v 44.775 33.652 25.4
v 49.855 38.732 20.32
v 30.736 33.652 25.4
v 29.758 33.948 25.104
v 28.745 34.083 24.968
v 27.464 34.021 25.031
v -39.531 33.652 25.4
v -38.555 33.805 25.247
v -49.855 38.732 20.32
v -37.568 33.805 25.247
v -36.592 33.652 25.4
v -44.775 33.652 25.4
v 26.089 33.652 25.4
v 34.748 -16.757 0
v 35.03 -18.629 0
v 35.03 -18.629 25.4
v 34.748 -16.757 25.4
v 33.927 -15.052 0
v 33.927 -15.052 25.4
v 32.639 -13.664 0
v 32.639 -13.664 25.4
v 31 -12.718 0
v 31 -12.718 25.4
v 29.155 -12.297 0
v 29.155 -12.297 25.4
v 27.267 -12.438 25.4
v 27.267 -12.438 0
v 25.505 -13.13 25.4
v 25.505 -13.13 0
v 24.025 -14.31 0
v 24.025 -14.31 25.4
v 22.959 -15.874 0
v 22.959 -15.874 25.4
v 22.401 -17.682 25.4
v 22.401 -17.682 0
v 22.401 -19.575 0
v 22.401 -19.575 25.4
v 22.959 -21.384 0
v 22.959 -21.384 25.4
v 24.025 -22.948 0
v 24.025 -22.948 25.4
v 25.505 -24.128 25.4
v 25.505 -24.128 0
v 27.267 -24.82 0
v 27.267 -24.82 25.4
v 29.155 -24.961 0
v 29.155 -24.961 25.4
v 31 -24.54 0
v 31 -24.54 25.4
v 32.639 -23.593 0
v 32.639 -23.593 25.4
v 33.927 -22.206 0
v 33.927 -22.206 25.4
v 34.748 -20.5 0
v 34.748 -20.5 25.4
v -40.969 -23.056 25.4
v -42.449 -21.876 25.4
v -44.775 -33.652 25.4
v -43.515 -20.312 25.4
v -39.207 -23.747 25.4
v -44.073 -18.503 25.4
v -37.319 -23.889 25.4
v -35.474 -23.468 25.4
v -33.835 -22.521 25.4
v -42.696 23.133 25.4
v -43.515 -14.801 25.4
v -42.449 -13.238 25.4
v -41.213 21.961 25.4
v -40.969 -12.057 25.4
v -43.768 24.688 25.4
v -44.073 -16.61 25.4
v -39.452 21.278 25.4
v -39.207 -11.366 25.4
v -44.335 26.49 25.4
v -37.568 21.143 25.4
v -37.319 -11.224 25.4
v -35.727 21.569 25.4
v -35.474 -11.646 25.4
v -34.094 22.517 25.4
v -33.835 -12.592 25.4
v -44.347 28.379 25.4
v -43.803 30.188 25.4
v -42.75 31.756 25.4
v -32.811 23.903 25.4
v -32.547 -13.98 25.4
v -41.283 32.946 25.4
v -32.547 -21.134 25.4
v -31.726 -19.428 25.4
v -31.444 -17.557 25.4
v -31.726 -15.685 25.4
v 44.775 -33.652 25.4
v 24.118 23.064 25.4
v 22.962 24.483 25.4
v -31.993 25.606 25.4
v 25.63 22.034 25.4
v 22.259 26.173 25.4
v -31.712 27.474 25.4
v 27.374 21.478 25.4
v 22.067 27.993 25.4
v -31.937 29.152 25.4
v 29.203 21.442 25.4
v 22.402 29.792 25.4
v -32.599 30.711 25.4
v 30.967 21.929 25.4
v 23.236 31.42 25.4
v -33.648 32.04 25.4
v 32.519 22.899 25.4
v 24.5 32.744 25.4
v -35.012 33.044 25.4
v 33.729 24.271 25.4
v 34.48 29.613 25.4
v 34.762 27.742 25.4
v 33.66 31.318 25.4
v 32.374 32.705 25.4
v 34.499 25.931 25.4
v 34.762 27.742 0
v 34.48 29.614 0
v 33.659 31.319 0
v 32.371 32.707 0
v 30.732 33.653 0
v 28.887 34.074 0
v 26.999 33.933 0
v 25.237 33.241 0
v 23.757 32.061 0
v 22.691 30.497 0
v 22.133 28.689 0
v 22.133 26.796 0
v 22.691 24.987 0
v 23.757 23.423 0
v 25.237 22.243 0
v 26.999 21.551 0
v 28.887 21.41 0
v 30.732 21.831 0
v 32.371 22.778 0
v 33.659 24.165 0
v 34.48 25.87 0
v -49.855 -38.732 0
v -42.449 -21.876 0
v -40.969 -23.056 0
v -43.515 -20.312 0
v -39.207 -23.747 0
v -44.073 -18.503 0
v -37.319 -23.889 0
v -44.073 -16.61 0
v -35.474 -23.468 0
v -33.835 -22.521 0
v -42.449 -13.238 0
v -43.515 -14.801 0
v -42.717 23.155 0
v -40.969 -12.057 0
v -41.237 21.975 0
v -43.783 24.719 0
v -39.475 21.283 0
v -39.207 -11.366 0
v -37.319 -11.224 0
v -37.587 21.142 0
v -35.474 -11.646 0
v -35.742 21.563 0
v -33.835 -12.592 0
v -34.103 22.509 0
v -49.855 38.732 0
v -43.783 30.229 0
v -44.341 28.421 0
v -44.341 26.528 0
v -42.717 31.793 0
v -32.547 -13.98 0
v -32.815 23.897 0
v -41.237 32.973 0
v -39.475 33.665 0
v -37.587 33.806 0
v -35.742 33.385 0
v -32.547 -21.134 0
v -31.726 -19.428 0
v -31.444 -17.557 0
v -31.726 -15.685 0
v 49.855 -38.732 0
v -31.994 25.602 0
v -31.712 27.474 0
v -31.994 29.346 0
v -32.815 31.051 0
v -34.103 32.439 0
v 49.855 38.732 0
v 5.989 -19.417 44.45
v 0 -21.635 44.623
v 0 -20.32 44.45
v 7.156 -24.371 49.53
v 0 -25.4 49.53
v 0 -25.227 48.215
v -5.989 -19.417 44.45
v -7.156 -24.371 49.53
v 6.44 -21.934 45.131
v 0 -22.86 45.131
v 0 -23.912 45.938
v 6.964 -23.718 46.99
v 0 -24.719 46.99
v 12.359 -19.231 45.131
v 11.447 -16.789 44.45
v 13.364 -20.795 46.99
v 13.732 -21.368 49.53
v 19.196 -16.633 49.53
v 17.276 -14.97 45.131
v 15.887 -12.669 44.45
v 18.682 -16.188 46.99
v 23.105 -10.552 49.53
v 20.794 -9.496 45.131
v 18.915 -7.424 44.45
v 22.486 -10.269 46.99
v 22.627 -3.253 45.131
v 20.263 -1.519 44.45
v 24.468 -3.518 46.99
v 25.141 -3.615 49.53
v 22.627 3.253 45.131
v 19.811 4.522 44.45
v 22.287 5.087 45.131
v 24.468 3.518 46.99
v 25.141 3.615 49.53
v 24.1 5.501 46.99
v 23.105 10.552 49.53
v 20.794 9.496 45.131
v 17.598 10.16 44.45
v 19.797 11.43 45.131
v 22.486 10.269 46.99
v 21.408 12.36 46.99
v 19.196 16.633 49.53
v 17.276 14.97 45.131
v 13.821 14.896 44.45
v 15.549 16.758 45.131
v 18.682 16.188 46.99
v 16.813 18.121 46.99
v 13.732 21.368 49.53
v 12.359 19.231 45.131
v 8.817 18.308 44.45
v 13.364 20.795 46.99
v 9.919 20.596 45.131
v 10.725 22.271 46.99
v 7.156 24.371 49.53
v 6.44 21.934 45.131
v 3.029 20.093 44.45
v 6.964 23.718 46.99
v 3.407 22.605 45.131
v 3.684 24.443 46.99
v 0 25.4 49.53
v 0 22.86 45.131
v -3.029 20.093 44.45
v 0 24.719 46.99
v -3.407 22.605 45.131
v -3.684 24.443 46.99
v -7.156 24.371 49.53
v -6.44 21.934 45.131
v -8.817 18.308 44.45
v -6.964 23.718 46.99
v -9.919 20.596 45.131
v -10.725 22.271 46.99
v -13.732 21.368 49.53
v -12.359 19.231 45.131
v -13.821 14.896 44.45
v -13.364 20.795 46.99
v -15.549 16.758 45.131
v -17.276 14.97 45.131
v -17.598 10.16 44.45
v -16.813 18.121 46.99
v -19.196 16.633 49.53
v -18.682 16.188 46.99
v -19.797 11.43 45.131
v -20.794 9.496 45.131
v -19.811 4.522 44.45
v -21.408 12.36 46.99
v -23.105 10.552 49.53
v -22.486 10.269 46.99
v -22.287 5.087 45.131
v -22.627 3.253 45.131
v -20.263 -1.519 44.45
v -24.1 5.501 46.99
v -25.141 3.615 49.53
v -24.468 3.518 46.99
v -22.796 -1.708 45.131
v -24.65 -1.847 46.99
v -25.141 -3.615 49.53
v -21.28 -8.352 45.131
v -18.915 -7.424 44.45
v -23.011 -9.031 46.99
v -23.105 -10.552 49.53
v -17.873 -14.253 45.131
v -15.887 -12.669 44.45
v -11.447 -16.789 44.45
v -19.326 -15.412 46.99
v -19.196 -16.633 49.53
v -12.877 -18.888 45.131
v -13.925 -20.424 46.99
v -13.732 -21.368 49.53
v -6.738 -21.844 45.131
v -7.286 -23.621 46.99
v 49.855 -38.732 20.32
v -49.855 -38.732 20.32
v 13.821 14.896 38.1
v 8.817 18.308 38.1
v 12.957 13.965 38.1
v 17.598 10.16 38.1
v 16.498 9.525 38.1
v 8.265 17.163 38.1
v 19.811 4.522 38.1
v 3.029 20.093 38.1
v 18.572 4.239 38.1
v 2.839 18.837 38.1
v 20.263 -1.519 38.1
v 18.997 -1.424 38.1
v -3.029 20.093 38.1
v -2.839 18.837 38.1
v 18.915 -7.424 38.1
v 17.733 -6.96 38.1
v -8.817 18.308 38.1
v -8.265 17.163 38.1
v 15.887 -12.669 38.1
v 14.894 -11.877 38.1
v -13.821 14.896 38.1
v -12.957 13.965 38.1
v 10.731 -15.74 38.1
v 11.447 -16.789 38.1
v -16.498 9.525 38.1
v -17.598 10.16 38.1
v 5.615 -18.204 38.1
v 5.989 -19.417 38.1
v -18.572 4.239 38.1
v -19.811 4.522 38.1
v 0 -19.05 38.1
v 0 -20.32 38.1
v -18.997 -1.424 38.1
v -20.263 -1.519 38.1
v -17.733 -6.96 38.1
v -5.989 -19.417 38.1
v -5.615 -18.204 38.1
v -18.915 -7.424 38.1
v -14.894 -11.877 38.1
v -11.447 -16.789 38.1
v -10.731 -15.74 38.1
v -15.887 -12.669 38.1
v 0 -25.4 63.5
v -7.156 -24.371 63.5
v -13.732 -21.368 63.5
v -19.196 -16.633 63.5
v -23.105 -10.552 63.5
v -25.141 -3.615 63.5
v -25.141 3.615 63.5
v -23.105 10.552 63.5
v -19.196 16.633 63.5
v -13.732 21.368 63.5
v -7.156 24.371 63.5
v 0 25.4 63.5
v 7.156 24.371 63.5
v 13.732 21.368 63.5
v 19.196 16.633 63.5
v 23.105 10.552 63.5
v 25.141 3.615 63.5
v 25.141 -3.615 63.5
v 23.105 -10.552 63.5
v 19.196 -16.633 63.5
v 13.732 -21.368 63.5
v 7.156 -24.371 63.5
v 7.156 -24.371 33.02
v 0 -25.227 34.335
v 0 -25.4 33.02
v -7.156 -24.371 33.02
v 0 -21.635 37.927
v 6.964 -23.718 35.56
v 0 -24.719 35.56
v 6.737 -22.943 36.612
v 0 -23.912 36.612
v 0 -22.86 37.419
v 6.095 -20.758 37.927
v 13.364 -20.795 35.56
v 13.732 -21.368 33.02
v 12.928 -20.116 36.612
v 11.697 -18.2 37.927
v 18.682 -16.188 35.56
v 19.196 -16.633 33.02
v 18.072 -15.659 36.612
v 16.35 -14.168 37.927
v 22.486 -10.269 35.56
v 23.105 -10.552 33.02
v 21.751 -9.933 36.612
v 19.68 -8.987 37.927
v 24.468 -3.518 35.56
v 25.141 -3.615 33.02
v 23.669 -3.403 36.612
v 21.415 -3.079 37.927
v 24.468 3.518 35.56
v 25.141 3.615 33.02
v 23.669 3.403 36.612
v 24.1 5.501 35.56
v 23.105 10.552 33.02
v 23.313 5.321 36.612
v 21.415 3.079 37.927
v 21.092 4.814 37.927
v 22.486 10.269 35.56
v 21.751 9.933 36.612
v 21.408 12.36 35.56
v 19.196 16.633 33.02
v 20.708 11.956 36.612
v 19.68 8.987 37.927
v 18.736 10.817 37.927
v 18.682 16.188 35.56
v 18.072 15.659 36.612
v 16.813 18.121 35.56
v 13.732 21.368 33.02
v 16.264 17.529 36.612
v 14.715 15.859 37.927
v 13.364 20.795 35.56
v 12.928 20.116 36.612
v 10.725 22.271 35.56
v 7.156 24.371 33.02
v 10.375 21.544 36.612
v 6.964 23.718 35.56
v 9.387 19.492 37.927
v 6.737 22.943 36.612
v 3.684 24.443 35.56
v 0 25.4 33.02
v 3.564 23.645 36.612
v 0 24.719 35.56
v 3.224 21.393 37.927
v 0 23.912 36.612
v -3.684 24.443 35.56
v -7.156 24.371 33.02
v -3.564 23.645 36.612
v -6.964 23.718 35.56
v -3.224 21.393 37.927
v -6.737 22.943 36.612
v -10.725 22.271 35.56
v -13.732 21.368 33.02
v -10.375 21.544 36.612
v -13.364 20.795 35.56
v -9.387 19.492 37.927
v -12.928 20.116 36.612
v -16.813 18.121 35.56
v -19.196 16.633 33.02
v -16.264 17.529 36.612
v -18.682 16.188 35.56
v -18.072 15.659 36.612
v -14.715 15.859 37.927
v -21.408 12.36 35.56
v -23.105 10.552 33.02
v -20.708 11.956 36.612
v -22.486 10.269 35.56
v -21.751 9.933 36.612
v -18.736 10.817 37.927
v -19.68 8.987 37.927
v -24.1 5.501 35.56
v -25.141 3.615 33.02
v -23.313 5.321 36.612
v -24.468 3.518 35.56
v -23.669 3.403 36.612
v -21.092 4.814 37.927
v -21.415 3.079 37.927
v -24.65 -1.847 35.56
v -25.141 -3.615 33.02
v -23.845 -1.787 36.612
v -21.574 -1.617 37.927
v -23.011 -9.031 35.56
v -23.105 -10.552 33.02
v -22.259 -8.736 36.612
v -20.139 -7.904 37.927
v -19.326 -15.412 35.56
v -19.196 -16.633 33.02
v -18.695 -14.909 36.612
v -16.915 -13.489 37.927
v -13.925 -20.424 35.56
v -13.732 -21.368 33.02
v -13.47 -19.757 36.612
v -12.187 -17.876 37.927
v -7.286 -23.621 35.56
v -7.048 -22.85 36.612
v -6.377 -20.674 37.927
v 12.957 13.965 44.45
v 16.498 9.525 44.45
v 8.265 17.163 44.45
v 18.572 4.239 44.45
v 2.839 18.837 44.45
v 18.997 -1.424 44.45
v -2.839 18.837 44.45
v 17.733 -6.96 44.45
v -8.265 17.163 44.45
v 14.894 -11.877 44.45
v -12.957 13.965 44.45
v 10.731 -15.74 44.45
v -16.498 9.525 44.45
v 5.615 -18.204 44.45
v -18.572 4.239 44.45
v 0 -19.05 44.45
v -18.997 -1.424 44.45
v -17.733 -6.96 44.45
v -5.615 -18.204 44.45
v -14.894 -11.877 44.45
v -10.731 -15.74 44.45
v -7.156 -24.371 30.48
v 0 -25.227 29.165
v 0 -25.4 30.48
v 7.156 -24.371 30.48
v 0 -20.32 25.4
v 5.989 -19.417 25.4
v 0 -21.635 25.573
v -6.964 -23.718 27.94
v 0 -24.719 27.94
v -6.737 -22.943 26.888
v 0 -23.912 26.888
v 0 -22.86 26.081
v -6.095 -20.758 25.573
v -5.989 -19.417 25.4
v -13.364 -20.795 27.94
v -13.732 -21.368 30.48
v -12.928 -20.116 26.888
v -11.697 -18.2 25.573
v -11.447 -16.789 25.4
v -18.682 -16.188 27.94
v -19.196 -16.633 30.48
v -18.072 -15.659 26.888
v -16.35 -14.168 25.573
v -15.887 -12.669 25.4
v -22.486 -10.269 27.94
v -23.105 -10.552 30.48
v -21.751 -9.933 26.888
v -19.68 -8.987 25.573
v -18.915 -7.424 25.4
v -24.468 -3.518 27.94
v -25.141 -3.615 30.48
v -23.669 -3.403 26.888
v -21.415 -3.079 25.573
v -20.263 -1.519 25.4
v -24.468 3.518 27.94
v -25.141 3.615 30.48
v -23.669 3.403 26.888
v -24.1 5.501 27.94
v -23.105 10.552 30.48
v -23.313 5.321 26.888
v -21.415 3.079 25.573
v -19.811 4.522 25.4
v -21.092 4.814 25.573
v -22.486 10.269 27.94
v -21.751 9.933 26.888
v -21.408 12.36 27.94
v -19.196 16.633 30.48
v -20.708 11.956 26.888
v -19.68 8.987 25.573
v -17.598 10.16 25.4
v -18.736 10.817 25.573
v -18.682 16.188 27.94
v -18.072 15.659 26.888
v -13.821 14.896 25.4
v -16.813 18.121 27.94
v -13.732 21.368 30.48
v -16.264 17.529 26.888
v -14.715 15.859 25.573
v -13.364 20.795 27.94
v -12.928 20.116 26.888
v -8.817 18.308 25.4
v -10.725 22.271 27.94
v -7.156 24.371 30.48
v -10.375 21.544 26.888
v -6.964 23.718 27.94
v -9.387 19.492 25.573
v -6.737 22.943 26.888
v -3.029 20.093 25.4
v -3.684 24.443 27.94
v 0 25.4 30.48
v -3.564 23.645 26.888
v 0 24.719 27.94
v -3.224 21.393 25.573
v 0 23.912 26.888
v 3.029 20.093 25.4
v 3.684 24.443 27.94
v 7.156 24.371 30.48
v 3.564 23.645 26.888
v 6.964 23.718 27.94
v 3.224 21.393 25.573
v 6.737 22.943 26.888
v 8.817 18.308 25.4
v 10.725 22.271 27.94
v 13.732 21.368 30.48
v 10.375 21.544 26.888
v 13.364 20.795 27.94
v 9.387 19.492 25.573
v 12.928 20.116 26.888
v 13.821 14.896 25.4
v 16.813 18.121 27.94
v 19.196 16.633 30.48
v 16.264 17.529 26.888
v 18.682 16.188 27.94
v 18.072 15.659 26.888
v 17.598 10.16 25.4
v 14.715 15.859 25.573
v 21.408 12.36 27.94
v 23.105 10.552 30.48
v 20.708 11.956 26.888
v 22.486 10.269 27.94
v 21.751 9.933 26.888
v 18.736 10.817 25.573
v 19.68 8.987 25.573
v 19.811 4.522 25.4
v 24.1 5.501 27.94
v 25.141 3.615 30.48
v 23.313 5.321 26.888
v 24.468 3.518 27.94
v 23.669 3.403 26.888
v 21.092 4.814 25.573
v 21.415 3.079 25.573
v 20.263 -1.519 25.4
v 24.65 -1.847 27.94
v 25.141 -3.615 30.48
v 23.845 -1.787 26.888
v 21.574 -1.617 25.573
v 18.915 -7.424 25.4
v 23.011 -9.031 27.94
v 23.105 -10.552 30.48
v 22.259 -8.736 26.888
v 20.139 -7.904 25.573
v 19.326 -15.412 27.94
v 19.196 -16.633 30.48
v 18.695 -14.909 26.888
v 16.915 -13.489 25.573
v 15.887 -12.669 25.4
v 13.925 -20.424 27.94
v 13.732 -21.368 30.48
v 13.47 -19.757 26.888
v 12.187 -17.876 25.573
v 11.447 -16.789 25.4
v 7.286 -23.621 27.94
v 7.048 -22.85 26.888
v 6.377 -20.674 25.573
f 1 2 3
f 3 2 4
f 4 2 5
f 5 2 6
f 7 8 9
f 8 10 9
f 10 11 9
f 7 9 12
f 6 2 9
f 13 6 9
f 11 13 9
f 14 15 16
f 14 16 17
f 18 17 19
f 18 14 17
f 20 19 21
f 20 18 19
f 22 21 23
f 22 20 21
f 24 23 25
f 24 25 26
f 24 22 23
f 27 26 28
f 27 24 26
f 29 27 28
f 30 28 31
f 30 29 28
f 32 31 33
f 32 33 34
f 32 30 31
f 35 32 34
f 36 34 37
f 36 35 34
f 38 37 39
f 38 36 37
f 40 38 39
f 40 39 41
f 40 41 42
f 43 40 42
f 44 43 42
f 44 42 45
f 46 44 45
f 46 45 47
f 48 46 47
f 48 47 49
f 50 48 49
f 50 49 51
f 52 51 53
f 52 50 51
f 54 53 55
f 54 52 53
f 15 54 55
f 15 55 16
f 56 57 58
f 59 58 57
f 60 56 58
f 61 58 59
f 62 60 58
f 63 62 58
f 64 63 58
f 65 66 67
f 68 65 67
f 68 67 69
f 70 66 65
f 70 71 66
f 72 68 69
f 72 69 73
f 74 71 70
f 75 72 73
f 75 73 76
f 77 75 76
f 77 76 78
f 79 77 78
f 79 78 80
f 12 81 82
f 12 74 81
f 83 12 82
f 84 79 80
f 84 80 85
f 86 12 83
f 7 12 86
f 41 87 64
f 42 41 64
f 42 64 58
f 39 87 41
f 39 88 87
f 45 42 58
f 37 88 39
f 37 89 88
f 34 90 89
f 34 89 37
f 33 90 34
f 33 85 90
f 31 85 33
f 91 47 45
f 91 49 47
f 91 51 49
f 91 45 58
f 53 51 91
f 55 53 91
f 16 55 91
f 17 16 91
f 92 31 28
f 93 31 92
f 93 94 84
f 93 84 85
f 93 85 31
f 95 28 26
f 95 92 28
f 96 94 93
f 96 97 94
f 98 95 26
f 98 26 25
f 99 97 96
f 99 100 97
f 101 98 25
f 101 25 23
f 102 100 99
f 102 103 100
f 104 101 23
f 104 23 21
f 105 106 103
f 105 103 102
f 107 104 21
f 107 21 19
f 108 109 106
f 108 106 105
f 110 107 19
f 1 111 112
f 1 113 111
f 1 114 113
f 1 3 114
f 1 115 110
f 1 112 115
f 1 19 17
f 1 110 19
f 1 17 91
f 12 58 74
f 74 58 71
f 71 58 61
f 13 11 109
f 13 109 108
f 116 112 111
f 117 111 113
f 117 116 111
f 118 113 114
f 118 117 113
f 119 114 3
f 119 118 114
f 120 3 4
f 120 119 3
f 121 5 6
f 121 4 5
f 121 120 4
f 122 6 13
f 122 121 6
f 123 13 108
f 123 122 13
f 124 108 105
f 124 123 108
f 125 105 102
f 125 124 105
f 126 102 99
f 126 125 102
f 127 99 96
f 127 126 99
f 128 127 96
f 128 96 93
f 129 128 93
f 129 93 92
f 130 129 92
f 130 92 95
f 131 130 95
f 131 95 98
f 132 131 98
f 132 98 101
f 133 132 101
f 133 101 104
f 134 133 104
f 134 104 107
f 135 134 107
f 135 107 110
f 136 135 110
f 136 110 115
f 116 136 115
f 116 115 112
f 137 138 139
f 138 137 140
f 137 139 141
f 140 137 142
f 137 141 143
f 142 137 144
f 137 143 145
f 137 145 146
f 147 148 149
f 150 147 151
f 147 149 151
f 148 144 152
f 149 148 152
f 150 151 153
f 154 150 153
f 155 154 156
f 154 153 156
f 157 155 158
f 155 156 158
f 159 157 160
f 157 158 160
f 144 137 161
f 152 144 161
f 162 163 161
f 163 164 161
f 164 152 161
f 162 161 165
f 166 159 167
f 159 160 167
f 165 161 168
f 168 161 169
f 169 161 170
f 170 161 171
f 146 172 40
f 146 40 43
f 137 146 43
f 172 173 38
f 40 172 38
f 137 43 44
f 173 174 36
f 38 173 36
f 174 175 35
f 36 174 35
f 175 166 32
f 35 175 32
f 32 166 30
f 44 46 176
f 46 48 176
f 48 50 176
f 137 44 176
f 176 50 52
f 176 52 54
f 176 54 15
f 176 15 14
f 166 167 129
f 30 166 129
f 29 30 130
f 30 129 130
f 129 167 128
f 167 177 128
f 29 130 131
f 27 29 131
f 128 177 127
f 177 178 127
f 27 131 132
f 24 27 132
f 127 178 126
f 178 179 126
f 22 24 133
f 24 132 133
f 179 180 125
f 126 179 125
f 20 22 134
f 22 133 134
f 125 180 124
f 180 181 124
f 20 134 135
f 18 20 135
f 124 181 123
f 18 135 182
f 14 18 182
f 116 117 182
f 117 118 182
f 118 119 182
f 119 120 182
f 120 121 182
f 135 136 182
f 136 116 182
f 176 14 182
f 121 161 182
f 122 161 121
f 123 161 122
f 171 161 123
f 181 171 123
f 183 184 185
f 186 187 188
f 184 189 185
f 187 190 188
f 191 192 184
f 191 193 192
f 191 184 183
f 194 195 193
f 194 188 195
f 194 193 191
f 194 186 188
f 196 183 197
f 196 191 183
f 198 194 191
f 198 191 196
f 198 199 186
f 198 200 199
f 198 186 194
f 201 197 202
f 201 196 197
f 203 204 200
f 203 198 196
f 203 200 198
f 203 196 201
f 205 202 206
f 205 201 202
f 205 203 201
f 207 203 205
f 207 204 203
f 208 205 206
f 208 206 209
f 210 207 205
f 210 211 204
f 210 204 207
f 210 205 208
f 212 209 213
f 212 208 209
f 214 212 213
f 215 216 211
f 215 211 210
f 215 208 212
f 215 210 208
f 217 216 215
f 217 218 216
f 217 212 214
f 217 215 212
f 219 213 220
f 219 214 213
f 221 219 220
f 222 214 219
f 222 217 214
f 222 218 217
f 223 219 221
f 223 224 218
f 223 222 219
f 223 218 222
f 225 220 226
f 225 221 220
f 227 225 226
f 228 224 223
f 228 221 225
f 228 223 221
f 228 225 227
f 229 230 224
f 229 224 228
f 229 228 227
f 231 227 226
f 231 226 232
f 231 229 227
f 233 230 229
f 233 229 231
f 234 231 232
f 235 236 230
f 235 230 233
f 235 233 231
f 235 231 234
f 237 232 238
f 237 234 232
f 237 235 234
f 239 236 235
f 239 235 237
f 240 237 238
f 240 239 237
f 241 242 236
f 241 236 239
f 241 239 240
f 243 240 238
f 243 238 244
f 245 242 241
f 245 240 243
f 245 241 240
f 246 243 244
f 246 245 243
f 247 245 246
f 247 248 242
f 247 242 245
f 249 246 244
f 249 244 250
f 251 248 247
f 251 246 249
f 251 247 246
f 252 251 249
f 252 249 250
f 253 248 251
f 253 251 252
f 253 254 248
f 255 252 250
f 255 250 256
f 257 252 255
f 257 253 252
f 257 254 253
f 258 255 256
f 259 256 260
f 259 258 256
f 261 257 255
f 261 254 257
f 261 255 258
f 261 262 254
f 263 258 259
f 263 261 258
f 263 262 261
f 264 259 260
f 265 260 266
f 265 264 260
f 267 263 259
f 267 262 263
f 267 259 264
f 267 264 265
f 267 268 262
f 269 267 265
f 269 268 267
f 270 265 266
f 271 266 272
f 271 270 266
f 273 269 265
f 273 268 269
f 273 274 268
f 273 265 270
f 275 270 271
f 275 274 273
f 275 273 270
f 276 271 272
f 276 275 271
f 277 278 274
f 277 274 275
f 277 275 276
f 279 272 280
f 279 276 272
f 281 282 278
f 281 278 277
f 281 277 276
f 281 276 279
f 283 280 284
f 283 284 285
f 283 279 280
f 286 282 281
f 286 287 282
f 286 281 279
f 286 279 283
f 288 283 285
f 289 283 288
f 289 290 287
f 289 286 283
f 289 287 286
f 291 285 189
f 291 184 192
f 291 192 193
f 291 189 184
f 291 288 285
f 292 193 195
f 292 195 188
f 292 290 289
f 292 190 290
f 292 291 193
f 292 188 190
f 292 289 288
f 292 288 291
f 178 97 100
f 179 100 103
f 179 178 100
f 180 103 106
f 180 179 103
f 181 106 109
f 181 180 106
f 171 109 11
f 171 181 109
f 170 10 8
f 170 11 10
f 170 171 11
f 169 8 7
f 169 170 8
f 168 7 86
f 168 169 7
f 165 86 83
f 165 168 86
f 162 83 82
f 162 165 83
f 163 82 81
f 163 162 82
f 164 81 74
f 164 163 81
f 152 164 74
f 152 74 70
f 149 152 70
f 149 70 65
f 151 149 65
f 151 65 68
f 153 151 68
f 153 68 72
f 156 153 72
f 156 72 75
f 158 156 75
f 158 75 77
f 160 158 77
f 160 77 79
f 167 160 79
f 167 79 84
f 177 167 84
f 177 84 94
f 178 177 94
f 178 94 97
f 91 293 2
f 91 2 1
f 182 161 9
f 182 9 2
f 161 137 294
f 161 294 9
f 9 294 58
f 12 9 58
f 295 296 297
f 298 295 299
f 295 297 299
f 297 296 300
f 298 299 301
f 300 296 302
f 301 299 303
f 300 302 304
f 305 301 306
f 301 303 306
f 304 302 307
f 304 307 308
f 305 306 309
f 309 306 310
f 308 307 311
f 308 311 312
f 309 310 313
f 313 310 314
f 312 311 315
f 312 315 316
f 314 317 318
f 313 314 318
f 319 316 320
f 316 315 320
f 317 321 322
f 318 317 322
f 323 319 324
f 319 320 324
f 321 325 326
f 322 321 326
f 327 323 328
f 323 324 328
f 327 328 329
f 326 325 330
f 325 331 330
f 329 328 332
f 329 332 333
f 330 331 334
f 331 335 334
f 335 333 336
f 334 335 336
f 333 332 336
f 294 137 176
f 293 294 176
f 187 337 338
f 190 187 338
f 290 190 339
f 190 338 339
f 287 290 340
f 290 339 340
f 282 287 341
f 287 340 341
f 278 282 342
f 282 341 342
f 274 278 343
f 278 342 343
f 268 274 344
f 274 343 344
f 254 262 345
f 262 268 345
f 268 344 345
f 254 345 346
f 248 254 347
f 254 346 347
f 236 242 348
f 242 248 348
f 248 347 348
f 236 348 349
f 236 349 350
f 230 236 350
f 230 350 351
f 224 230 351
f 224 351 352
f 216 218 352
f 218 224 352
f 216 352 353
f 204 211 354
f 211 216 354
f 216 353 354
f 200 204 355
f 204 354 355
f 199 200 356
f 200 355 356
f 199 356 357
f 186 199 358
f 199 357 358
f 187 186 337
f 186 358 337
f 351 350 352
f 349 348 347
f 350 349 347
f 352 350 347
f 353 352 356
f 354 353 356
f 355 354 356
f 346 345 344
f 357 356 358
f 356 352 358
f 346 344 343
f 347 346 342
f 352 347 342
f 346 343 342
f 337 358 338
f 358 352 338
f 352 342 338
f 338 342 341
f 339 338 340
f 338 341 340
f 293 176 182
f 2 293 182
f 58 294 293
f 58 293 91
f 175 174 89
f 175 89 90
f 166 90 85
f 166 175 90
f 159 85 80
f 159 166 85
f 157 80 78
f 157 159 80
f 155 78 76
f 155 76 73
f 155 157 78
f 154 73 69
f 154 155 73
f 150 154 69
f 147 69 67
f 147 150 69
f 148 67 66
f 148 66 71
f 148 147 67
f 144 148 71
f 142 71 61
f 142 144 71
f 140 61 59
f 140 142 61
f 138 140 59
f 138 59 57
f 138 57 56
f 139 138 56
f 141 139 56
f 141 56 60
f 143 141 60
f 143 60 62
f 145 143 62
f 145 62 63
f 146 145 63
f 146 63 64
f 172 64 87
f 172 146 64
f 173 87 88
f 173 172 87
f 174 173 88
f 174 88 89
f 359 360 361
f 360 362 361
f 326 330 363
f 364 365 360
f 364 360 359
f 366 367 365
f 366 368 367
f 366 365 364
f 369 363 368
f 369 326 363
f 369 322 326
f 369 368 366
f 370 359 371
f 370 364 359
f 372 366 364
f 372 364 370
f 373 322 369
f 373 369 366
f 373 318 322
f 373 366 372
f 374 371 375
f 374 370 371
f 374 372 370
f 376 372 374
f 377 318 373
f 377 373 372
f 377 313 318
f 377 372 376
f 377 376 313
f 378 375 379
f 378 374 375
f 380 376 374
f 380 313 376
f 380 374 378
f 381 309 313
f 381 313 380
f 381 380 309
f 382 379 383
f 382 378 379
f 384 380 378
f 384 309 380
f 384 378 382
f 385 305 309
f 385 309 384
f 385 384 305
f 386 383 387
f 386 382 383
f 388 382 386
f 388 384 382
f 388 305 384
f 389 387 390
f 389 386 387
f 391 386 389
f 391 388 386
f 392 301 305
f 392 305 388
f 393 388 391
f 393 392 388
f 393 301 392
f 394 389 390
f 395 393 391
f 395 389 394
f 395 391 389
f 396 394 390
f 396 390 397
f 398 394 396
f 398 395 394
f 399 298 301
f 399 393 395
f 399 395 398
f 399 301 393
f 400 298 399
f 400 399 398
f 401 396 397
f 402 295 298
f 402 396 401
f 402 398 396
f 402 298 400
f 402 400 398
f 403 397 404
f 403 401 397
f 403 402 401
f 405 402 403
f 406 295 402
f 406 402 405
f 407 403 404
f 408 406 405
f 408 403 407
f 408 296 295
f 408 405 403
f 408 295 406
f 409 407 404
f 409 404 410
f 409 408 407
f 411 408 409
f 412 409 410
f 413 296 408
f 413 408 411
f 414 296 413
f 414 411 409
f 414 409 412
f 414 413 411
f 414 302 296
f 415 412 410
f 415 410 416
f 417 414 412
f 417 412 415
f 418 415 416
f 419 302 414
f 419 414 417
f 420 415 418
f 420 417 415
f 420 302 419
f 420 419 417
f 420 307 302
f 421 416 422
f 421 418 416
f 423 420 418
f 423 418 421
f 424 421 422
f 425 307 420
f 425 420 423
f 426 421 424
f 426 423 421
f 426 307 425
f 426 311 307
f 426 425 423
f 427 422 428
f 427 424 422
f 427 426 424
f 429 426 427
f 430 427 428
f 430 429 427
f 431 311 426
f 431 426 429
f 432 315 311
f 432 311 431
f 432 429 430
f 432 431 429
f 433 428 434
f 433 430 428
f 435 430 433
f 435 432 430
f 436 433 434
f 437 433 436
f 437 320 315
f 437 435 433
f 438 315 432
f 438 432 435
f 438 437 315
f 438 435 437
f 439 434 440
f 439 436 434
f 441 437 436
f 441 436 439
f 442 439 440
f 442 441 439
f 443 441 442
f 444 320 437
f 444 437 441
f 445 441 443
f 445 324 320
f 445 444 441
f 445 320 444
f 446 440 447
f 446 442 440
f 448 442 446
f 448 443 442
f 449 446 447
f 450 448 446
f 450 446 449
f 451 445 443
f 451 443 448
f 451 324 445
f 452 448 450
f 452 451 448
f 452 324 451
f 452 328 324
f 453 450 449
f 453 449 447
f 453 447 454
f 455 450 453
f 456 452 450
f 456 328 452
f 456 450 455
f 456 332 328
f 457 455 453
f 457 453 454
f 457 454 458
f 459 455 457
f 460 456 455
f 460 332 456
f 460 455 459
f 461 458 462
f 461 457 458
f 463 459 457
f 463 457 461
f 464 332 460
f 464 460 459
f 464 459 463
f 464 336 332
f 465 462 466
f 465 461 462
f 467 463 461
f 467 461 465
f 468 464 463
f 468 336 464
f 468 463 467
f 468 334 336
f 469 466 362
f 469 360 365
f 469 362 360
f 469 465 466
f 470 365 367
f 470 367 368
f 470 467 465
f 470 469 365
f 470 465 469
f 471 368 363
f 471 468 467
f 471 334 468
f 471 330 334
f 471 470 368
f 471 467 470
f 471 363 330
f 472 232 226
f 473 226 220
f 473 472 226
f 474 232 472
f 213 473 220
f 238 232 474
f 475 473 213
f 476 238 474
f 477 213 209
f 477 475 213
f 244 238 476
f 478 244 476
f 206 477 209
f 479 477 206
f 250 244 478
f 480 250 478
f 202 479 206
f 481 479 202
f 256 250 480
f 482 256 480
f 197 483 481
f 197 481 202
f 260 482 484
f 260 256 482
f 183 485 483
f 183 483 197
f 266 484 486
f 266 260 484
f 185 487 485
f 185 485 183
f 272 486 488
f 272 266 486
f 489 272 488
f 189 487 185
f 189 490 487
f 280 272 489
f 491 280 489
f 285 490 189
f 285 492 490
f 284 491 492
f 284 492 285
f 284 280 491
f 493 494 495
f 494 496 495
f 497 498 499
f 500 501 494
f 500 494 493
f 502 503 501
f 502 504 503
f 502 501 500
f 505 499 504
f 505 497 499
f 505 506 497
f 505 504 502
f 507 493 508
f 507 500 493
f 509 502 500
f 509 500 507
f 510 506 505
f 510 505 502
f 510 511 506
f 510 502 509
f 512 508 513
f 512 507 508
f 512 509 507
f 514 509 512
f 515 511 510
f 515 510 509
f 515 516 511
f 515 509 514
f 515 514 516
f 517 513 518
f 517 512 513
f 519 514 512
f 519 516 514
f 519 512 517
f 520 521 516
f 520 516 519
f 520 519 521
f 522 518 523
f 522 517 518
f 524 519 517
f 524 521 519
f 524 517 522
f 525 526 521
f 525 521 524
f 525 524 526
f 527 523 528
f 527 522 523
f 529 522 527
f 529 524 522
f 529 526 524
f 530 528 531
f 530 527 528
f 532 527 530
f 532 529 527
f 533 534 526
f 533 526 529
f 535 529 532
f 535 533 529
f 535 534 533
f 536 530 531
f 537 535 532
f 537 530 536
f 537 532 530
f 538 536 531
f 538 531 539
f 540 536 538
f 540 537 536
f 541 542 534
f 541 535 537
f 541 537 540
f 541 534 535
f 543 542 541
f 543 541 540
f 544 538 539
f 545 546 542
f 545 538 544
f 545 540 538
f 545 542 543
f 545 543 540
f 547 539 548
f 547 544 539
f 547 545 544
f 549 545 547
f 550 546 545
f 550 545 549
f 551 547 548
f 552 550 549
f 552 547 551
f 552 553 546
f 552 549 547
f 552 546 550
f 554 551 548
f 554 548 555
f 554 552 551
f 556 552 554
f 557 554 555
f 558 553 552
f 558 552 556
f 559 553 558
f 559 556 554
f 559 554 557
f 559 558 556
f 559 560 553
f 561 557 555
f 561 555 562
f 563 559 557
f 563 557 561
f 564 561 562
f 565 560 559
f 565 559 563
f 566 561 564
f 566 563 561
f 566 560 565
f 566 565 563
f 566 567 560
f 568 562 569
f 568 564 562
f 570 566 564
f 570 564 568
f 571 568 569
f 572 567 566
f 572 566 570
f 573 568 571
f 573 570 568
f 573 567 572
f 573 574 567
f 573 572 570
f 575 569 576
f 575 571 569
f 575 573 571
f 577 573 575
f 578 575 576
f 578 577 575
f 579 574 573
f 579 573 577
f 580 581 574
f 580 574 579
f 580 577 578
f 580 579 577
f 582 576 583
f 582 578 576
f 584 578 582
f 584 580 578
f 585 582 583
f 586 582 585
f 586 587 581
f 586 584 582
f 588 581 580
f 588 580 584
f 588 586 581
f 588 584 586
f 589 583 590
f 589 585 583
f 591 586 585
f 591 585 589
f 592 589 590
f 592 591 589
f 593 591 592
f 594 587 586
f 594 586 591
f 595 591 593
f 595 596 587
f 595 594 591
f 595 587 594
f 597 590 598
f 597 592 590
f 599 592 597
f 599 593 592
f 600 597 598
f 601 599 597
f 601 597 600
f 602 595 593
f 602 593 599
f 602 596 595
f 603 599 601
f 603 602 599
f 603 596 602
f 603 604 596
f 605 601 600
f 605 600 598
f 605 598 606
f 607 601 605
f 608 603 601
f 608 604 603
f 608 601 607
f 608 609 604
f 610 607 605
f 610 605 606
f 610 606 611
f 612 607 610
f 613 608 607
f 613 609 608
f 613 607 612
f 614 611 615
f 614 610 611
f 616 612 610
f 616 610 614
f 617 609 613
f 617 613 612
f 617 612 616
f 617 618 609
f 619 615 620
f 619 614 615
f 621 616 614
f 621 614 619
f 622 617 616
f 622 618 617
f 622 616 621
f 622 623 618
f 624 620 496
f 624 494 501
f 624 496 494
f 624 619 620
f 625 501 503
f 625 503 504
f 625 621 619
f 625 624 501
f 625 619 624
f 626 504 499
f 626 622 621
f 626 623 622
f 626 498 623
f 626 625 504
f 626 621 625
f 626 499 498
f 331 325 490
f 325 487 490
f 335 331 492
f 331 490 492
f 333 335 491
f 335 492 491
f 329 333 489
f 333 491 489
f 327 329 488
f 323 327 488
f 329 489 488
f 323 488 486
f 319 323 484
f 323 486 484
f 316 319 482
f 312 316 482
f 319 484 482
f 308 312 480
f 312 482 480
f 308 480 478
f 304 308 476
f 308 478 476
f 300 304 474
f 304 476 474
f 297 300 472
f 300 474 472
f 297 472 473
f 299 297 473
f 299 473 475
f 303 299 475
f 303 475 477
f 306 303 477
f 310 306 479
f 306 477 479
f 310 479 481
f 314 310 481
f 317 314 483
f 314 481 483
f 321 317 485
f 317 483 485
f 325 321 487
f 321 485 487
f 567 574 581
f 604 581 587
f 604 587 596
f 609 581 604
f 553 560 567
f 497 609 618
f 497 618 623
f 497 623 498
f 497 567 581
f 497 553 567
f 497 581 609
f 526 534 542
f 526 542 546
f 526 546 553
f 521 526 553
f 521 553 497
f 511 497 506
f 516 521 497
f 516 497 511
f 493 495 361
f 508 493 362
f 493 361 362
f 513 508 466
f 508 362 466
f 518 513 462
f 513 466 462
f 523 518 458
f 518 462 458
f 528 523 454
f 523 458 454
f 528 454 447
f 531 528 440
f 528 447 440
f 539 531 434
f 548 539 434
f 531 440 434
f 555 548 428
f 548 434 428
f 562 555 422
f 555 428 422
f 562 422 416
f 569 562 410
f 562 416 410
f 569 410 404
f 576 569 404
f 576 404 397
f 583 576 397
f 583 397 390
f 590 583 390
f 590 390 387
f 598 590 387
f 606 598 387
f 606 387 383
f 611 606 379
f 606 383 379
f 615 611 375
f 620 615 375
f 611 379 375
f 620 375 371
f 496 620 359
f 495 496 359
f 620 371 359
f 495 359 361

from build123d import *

# Parameters (mm, degrees)
F0_W        = 99.7109562159
F0_H        = 77.463619411
F0_R        = 6.35
F1_DEPTH    = 25.4
F2_W        = 25.4
F2_H        = 38.1
F4_W        = 18.3200901883
F4_H        = 6.35
F6_T1_DEPTH = 103.5919185687
F6_T3_DEPTH = 125.8392553736
F7_R        = 5.08
F8_R        = 5.08


# Not quite as in the source:
# - a fillet or chamfer that OpenCascade refuses, or shapes differently, is made with other operations: its cross-section is extruded or revolved along the edge and cut away or added


with BuildPart() as f1:
    # F0 (on Top) → F1 (new body)
    with BuildSketch(Plane.XY):
        Rectangle(F0_W, F0_H)
        with Locations((-37.7936698496, -17.5566338003)):
            Circle(F0_R, mode=Mode.SUBTRACT)
        with Locations((28.6803040653, -18.6287946999)):
            Circle(F0_R, mode=Mode.SUBTRACT)
        with Locations((-38.0617082119, 27.4741202593)):
            Circle(F0_R, mode=Mode.SUBTRACT)
        with Locations((28.4122619778, 27.7421604842)):
            Circle(F0_R, mode=Mode.SUBTRACT)
    extrude(amount=F1_DEPTH)

    # F6: chamfer of 5.08 on 4 edges, made by hand

    # F6_s2 → F6_t1 (cut)
    with BuildSketch(Plane.XZ.offset(-51.7959592844)):
        Polygon((49.8554781079, 20.32), (44.7754781079, 25.4), (49.8554781079, 25.4), align=None)
        Polygon((-49.8554781079, 20.32), (-44.7754781079, 25.4), (-49.8554781079, 25.4), align=None)
    extrude(amount=F6_T1_DEPTH, mode=Mode.SUBTRACT)

    # F6_s4 → F6_t3 (cut)
    with BuildSketch(Plane.YZ.offset(-62.9196276868)):
        Polygon((38.7318097055, 20.32), (33.6518097055, 25.4), (38.7318097055, 25.4), align=None)
        Polygon((-38.7318097055, 20.32), (-33.6518097055, 25.4), (-38.7318097055, 25.4), align=None)
    extrude(amount=F6_T3_DEPTH, mode=Mode.SUBTRACT)


with BuildPart() as f3:
    # F2 (on Right) → F3 (revolve)
    with BuildSketch(Plane.YZ):
        with Locations((-12.7, 44.45)):
            Rectangle(F2_W, F2_H)
    revolve(axis=Axis((0, 0, 44.45), (0, 0, -1)))

    # F4 (on Right) → F5 (revolve, cut)
    with BuildSketch(Plane.YZ):
        with Locations((-28.2100450942, 41.275)):
            Rectangle(F4_W, F4_H)
    revolve(axis=Axis((0, 0, 63.5), (0, 0, -1)), mode=Mode.SUBTRACT)

    # F7
    f7_edges = [f3.edges().sort_by_distance(p)[0] for p in [
        (0, 25.4, 38.1),
        (0, 25.4, 44.45),
    ]]
    fillet(f7_edges, radius=F7_R)

    # F8
    f8_edges = [f3.edges().sort_by_distance(p)[0] for p in [
        (0, 25.4, 25.4),
    ]]
    fillet(f8_edges, radius=F8_R)


solid = Compound([f1.part, f3.part])
